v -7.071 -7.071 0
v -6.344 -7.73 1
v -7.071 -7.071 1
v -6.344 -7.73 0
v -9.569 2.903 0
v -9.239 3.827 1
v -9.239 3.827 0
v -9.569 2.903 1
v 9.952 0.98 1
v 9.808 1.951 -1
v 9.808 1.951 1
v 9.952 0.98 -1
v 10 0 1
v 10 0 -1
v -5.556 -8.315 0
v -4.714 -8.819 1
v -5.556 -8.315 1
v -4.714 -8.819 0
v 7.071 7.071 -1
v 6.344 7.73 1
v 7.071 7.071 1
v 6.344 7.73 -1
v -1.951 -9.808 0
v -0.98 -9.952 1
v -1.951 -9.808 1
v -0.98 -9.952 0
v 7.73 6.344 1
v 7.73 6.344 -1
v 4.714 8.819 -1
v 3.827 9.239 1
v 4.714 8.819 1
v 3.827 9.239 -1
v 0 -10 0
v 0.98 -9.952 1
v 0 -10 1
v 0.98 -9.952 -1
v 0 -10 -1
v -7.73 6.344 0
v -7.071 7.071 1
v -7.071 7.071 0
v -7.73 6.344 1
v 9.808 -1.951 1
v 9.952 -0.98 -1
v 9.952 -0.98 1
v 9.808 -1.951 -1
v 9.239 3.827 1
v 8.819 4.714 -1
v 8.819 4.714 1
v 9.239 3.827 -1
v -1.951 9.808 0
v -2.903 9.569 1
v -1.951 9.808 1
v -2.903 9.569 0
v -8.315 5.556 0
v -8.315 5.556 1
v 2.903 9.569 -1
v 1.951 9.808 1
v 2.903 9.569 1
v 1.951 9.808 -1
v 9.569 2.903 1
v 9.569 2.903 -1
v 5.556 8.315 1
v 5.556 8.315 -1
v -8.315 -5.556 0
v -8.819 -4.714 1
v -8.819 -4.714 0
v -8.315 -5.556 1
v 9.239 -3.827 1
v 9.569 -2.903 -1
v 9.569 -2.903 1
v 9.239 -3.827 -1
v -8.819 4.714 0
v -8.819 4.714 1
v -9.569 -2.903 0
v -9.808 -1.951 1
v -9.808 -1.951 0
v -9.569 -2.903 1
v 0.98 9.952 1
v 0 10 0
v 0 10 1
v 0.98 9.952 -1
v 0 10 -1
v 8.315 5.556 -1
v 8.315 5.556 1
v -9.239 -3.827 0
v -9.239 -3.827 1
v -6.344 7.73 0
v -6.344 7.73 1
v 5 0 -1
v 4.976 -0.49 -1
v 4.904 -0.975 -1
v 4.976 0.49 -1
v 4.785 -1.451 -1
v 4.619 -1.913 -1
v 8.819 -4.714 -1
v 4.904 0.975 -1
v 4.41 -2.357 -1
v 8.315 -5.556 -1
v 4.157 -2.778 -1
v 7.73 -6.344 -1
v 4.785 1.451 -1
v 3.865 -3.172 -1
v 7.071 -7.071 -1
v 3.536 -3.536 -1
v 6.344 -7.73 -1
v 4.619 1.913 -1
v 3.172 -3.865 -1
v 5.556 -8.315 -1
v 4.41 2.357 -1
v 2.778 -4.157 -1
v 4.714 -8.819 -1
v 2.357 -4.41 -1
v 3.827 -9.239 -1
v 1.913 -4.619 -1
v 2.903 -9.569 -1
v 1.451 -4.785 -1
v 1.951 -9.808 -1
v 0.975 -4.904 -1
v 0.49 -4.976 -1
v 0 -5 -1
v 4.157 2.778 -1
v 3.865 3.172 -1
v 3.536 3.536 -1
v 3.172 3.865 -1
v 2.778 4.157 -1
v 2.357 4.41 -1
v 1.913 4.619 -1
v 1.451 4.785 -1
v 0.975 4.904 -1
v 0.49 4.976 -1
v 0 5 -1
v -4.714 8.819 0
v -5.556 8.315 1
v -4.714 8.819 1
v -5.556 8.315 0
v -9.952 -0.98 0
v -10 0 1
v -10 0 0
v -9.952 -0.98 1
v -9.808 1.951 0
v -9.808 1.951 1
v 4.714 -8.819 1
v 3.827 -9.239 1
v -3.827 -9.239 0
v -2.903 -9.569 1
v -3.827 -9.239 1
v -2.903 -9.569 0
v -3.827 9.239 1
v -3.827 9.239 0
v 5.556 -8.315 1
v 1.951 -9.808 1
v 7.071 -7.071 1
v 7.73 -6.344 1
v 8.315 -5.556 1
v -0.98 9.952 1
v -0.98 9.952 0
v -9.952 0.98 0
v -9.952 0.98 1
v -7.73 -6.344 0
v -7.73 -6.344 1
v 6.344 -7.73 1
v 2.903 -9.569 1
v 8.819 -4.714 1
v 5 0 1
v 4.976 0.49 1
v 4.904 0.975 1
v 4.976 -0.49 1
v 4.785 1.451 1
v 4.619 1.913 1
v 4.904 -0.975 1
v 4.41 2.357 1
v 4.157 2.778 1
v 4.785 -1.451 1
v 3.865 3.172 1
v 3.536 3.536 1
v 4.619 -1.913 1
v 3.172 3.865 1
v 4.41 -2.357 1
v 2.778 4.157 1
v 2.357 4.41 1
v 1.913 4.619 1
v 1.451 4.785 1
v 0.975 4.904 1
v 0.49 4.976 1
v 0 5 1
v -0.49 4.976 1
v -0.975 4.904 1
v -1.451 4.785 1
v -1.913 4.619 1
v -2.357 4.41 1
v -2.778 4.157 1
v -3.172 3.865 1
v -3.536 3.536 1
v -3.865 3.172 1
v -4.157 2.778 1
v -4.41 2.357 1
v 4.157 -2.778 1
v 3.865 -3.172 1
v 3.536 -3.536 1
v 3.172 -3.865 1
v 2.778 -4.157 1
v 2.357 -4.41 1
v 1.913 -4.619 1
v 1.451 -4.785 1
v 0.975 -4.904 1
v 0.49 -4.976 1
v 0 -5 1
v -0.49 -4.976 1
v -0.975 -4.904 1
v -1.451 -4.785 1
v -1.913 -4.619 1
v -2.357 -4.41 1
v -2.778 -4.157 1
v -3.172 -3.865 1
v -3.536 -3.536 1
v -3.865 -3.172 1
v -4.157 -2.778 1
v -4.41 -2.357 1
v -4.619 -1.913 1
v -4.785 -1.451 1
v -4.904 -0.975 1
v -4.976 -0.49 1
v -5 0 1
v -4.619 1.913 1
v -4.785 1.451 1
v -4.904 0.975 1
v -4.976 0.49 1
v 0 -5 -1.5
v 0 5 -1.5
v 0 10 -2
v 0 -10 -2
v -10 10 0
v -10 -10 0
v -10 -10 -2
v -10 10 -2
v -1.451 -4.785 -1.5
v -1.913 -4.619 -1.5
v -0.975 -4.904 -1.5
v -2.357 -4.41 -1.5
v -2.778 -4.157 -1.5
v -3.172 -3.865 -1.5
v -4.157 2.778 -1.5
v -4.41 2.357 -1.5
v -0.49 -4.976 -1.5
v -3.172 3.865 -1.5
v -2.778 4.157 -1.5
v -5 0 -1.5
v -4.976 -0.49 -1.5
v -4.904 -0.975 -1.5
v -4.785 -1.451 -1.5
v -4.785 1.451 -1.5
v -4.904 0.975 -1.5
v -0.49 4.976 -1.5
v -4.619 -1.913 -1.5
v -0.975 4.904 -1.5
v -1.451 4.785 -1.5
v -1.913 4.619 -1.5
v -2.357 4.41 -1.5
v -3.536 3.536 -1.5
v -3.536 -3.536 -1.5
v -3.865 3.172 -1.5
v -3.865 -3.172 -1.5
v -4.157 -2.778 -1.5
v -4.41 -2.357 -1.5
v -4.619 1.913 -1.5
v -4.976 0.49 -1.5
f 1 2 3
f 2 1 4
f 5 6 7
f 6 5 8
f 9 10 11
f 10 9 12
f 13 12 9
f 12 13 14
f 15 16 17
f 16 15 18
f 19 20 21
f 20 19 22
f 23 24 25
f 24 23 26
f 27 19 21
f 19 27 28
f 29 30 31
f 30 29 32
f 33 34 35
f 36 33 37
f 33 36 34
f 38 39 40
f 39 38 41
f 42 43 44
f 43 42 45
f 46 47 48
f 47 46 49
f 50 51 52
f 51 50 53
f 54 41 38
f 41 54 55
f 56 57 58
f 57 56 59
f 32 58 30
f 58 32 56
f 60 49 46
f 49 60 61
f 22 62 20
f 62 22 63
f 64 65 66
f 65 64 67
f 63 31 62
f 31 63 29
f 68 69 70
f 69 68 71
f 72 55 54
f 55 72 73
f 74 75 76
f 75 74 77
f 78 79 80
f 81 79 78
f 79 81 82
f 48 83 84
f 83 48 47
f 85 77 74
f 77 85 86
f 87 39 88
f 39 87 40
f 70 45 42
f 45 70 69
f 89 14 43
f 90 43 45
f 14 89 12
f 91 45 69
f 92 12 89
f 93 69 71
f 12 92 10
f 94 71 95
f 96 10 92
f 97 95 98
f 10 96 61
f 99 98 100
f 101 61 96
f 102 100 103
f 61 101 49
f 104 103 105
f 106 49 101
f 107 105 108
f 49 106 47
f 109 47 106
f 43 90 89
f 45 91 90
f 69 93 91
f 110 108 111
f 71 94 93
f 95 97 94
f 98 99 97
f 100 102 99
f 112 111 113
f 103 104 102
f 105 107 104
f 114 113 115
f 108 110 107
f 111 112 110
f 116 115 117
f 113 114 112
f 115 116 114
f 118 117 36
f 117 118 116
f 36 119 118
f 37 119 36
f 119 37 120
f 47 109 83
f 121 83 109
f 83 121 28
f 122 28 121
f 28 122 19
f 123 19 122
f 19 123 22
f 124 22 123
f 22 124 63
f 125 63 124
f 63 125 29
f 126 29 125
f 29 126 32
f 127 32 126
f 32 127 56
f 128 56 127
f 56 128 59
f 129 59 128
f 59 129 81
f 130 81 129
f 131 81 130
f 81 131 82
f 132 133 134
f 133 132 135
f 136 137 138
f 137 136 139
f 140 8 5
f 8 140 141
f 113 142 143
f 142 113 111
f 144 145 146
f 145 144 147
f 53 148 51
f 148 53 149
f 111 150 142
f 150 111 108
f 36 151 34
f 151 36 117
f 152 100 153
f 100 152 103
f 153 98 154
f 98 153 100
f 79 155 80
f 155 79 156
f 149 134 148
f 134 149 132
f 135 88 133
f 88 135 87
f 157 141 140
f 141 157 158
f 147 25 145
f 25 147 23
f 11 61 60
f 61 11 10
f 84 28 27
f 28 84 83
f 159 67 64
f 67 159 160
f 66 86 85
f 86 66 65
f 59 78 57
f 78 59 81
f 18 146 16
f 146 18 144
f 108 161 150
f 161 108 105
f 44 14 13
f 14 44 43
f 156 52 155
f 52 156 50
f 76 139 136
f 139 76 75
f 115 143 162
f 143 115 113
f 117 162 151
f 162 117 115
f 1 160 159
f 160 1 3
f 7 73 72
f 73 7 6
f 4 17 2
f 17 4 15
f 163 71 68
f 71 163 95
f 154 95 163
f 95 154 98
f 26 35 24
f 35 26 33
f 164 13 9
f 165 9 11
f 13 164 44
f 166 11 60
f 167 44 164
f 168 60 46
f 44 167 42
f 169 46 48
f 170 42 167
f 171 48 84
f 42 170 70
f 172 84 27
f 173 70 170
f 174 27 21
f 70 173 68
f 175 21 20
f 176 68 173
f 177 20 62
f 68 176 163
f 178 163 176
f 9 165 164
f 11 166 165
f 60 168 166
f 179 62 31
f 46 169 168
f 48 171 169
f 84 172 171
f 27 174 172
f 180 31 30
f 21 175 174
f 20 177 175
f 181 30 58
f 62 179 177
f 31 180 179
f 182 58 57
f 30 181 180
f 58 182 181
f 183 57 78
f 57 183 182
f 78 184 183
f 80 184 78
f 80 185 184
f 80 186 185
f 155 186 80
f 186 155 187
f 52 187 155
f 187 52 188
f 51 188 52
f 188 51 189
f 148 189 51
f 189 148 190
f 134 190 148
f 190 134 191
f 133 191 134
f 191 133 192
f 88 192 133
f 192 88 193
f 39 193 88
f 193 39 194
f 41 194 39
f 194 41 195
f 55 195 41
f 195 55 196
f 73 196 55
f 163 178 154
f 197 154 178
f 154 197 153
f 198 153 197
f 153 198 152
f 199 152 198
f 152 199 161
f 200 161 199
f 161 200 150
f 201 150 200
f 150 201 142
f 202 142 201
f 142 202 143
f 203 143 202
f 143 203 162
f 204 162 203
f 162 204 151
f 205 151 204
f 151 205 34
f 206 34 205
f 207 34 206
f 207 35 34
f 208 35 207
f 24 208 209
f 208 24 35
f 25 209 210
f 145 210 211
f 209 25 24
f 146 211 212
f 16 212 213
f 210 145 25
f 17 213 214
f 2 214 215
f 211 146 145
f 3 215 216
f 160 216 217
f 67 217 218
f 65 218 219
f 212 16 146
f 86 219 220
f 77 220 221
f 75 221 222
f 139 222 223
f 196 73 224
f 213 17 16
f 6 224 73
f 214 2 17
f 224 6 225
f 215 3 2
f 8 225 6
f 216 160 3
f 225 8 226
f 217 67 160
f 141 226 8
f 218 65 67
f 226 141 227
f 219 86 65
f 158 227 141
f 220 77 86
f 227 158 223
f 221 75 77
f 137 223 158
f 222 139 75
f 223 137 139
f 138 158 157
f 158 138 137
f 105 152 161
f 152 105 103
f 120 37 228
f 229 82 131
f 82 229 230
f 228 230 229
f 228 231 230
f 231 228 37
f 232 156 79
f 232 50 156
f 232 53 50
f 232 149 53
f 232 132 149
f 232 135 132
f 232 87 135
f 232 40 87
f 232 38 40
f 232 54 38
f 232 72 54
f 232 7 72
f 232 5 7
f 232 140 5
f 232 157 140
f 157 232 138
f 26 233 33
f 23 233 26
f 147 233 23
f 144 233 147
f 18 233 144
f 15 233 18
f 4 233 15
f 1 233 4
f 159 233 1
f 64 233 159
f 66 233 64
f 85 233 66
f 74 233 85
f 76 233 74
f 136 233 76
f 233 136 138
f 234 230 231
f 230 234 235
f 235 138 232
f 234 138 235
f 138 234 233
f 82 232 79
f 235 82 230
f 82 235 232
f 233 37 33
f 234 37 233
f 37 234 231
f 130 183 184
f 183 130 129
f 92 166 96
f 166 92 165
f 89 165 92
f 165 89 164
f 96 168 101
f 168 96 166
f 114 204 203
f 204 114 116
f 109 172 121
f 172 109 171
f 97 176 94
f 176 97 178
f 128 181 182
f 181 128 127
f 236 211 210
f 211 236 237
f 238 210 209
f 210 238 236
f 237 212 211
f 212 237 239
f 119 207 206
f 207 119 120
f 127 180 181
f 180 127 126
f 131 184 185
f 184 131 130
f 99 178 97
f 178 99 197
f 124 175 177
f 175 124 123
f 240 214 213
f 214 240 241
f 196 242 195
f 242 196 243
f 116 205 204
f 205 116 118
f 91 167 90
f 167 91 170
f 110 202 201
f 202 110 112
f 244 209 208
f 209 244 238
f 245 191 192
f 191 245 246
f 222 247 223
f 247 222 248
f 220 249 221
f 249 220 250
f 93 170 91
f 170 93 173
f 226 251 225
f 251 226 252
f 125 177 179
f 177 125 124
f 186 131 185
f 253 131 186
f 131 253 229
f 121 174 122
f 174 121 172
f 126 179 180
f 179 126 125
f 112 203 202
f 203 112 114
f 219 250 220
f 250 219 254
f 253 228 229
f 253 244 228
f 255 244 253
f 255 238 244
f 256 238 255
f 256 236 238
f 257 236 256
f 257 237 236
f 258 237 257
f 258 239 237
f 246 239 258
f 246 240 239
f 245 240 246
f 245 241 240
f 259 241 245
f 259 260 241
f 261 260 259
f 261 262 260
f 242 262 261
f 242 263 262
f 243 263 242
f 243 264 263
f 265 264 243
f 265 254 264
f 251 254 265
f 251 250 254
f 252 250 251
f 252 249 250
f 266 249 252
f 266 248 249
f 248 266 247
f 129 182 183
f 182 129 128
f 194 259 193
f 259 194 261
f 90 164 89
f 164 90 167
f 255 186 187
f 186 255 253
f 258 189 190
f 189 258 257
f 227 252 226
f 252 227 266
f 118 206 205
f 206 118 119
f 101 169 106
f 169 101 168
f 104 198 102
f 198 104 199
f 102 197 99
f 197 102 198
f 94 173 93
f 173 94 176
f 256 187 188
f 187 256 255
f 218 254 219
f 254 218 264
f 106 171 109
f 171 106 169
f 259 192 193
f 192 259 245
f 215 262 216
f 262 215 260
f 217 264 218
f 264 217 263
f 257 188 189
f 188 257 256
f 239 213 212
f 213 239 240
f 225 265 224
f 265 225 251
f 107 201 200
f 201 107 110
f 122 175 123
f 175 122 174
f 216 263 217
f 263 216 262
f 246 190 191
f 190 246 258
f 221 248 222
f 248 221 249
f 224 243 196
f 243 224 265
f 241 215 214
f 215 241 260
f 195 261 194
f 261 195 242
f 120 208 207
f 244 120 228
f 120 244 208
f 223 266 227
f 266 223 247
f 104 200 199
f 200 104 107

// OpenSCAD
module ring_terminal() {
    difference() {
        union() {
            // Main body of the terminal
            translate([0, 0, -1])
                cylinder(h=2, r=10, $fn=64);
            // Connector part of the terminal
            translate([-5, 0, -1])
                cube([10, 20, 2], center=true);
        }
        // Hole in the ring
        translate([0, 0, -1.5])
            cylinder(h=3, r=5, $fn=64);
    }
}

ring_terminal();
